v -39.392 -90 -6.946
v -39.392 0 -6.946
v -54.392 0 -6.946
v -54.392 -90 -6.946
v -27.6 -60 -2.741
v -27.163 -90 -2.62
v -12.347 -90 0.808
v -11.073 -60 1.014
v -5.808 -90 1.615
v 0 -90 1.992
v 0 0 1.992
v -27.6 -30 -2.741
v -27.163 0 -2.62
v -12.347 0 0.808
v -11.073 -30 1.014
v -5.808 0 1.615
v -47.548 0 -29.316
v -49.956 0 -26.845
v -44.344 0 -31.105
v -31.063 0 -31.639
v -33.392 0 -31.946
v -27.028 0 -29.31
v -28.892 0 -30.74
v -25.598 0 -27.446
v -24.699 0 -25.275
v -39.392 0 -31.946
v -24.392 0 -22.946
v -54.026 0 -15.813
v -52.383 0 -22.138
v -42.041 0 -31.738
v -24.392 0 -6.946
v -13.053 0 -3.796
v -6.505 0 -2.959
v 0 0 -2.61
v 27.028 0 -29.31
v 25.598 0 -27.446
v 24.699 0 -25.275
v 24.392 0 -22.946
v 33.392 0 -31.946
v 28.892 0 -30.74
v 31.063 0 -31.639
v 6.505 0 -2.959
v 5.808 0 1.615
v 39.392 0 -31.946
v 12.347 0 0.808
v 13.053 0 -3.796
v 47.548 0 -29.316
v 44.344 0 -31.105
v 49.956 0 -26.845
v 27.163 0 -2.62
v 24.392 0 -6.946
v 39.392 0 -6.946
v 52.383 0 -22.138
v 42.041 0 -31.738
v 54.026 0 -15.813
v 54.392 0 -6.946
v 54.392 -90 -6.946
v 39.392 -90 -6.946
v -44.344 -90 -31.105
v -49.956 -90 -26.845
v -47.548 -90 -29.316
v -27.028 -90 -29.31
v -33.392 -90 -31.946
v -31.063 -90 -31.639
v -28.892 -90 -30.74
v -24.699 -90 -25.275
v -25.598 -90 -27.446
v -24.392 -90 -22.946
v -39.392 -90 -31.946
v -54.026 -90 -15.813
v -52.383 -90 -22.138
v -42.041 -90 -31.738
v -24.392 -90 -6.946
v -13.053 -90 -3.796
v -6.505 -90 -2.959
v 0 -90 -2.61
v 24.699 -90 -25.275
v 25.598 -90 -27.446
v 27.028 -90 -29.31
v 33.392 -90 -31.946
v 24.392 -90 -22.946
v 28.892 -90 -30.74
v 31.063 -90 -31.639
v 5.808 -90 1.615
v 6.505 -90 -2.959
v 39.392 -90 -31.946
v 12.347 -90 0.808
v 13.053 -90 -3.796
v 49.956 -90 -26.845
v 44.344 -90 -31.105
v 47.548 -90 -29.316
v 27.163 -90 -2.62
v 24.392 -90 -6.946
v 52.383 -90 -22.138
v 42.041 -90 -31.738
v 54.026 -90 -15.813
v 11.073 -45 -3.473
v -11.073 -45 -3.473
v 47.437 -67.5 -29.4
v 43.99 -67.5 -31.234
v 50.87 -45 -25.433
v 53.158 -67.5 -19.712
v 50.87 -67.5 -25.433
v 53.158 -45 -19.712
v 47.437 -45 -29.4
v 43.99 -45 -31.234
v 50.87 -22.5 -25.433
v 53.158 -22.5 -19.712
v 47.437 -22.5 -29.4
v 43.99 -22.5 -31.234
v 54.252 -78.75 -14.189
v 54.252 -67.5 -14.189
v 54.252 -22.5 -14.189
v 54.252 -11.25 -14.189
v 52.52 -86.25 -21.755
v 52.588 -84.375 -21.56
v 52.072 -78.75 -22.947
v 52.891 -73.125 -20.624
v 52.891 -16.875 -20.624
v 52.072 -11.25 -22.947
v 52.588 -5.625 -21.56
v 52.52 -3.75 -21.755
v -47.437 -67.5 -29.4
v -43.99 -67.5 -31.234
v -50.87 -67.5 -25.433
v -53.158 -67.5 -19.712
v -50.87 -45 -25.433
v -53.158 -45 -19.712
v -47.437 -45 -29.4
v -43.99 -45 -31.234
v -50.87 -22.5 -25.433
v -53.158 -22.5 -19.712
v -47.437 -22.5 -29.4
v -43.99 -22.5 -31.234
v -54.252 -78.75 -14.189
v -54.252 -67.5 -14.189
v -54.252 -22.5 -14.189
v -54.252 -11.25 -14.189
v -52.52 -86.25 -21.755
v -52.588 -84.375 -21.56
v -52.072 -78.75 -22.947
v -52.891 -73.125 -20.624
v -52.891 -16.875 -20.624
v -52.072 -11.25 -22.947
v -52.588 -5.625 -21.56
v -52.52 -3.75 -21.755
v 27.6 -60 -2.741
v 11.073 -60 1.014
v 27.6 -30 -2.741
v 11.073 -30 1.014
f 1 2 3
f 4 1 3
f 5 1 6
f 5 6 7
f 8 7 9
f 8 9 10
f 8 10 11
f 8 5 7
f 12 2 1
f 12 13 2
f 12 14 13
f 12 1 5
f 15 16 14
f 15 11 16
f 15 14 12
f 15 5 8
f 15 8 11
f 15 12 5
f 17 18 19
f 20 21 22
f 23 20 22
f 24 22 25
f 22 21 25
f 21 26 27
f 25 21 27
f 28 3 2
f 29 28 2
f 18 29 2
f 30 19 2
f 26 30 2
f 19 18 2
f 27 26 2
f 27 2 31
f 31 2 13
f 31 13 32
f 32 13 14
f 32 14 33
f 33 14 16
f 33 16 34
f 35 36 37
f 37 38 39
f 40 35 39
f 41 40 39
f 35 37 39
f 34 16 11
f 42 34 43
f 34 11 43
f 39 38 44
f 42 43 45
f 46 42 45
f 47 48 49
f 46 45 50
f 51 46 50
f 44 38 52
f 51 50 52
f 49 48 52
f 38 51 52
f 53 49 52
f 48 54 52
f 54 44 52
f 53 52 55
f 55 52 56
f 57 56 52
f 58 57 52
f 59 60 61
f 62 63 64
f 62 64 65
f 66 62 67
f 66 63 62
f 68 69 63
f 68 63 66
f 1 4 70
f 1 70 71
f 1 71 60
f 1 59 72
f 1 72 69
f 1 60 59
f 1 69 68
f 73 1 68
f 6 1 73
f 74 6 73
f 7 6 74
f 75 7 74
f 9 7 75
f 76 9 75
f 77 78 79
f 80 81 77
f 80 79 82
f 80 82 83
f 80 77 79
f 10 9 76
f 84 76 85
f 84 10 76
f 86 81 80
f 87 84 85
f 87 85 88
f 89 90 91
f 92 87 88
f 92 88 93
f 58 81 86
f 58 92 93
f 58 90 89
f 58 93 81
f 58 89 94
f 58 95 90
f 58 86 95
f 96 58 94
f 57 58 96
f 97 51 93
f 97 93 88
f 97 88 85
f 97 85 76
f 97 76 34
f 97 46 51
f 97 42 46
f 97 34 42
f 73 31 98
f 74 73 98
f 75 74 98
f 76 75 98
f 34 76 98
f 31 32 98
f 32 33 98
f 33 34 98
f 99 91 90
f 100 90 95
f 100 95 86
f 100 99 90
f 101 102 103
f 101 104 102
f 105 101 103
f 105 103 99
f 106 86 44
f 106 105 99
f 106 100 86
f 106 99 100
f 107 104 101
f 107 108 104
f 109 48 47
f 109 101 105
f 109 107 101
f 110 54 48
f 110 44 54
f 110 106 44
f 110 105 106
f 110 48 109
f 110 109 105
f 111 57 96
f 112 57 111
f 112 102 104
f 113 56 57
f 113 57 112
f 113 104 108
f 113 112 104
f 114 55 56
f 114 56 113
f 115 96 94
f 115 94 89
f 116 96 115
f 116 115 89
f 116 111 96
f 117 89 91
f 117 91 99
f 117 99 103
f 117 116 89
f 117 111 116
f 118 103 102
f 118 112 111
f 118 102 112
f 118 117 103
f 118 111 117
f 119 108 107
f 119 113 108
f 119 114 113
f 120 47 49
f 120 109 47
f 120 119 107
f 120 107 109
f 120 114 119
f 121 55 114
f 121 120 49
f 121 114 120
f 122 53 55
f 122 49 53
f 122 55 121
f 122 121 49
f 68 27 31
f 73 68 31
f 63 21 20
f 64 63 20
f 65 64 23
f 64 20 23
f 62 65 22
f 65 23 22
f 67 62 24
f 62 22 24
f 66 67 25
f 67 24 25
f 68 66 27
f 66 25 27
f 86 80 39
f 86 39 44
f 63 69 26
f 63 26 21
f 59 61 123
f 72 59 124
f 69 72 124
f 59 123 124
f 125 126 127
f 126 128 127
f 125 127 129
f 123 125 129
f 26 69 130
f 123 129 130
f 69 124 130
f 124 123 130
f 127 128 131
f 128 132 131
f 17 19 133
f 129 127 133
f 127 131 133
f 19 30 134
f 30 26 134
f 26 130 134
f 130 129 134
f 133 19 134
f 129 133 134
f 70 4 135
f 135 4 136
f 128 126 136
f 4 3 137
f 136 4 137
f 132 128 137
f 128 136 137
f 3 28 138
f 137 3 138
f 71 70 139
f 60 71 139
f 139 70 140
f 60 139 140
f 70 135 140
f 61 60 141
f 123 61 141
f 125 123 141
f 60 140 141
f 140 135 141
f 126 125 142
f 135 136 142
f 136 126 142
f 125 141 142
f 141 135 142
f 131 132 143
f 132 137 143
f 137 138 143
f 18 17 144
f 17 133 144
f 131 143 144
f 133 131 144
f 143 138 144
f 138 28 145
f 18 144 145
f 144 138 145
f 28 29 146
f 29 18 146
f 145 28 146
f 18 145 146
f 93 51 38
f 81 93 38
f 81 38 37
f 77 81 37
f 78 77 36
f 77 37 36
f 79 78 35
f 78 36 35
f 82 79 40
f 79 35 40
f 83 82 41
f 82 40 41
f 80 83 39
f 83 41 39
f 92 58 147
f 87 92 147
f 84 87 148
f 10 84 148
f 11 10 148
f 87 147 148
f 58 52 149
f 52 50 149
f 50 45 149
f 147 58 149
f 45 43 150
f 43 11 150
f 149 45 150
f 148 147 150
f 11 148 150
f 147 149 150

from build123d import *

# Parameters (mm, degrees)
F1_DEPTH = 90


with BuildPart() as f1:
    # F0 (on Front) → F1 (new body)
    with BuildSketch(Plane.XZ):
        with BuildLine():
            Line((54.3923101205, -6.9459271067), (39.3923101205, -6.9459271067))
            Line((39.3923101205, -6.9459271067), (24.3923101205, -6.9459271067))
            Line((24.3923101205, -6.9459271067), (24.3923101205, -22.9459271067))
            ThreePointArc((24.3923101205, -22.9459271067), (27.0283490898, -29.3098881374), (33.3923101205, -31.9459271067))
            Line((33.3923101205, -31.9459271067), (39.3923101205, -31.9459271067))
            add(Edge.make_bspline(
                [(54.3923101205, -6.9459271067), (54.7600798309, -12.4650411308), (53.5760512989, -19.2747786322), (51.1416965676, -25.5090219107), (47.6191843875, -29.9359194122), (42.847190561, -31.9967957119), (39.3923101205, -31.9459271067)],
                knots=[0, 0, 0, 0, 0.318087546, 0.5385673182, 0.7419978267, 1, 1, 1, 1], degree=3))
        make_face()
        with BuildLine():
            Line((24.3923101205, -6.9459271067), (39.3923101205, -6.9459271067))
            add(Edge.make_bspline(
                [(39.3923101205, -6.9459271067), (34.4260372221, -4.787703976), (28.490868897, -2.8215542068), (10.9690373288, 1.5413653414), (3.5167664753, 1.7551726321), (0, 1.991873607)],
                knots=[0, 0, 0, 0, 0.3219844291, 0.6966090332, 1, 1, 1, 1], degree=3))
            add(Edge.make_bspline(
                [(-39.3923101205, -6.9459271067), (-34.4260372221, -4.787703976), (-28.490868897, -2.8215542068), (-10.9690373288, 1.5413653414), (-3.5167664753, 1.7551726321), (0, 1.991873607)],
                knots=[0, 0, 0, 0, 0.3219844291, 0.6966090332, 1, 1, 1, 1], degree=3))
            Line((-39.3923101205, -6.9459271067), (-24.3923101205, -6.9459271067))
            add(Edge.make_bspline(
                [(-24.3923101205, -6.9459271067), (-19.7168922052, -5.166058033), (-11.2405807669, -3.1169609653), (-3.7964381143, -2.7464545273), (0, -2.6104990393)],
                knots=[0, 0, 0, 0, 0.5268022864, 1, 1, 1, 1], degree=3))
            add(Edge.make_bspline(
                [(24.3923101205, -6.9459271067), (19.7168922052, -5.166058033), (11.2405807669, -3.1169609653), (3.7964381143, -2.7464545273), (0, -2.6104990393)],
                knots=[0, 0, 0, 0, 0.5268022864, 1, 1, 1, 1], degree=3))
        make_face()
        with BuildLine():
            Line((-24.3923101205, -6.9459271067), (-39.3923101205, -6.9459271067))
            Line((-39.3923101205, -6.9459271067), (-54.3923101205, -6.9459271067))
            add(Edge.make_bspline(
                [(-54.3923101205, -6.9459271067), (-54.7600798309, -12.4650411308), (-53.5760512989, -19.2747786322), (-51.1416965676, -25.5090219107), (-47.6191843875, -29.9359194122), (-42.847190561, -31.9967957119), (-39.3923101205, -31.9459271067)],
                knots=[0, 0, 0, 0, 0.318087546, 0.5385673182, 0.7419978267, 1, 1, 1, 1], degree=3))
            Line((-39.3923101205, -31.9459271067), (-33.3923101205, -31.9459271067))
            ThreePointArc((-33.3923101205, -31.9459271067), (-27.0283490898, -29.3098881374), (-24.3923101205, -22.9459271067))
            Line((-24.3923101205, -22.9459271067), (-24.3923101205, -6.9459271067))
        make_face()
    extrude(amount=F1_DEPTH)


solid = f1.part
